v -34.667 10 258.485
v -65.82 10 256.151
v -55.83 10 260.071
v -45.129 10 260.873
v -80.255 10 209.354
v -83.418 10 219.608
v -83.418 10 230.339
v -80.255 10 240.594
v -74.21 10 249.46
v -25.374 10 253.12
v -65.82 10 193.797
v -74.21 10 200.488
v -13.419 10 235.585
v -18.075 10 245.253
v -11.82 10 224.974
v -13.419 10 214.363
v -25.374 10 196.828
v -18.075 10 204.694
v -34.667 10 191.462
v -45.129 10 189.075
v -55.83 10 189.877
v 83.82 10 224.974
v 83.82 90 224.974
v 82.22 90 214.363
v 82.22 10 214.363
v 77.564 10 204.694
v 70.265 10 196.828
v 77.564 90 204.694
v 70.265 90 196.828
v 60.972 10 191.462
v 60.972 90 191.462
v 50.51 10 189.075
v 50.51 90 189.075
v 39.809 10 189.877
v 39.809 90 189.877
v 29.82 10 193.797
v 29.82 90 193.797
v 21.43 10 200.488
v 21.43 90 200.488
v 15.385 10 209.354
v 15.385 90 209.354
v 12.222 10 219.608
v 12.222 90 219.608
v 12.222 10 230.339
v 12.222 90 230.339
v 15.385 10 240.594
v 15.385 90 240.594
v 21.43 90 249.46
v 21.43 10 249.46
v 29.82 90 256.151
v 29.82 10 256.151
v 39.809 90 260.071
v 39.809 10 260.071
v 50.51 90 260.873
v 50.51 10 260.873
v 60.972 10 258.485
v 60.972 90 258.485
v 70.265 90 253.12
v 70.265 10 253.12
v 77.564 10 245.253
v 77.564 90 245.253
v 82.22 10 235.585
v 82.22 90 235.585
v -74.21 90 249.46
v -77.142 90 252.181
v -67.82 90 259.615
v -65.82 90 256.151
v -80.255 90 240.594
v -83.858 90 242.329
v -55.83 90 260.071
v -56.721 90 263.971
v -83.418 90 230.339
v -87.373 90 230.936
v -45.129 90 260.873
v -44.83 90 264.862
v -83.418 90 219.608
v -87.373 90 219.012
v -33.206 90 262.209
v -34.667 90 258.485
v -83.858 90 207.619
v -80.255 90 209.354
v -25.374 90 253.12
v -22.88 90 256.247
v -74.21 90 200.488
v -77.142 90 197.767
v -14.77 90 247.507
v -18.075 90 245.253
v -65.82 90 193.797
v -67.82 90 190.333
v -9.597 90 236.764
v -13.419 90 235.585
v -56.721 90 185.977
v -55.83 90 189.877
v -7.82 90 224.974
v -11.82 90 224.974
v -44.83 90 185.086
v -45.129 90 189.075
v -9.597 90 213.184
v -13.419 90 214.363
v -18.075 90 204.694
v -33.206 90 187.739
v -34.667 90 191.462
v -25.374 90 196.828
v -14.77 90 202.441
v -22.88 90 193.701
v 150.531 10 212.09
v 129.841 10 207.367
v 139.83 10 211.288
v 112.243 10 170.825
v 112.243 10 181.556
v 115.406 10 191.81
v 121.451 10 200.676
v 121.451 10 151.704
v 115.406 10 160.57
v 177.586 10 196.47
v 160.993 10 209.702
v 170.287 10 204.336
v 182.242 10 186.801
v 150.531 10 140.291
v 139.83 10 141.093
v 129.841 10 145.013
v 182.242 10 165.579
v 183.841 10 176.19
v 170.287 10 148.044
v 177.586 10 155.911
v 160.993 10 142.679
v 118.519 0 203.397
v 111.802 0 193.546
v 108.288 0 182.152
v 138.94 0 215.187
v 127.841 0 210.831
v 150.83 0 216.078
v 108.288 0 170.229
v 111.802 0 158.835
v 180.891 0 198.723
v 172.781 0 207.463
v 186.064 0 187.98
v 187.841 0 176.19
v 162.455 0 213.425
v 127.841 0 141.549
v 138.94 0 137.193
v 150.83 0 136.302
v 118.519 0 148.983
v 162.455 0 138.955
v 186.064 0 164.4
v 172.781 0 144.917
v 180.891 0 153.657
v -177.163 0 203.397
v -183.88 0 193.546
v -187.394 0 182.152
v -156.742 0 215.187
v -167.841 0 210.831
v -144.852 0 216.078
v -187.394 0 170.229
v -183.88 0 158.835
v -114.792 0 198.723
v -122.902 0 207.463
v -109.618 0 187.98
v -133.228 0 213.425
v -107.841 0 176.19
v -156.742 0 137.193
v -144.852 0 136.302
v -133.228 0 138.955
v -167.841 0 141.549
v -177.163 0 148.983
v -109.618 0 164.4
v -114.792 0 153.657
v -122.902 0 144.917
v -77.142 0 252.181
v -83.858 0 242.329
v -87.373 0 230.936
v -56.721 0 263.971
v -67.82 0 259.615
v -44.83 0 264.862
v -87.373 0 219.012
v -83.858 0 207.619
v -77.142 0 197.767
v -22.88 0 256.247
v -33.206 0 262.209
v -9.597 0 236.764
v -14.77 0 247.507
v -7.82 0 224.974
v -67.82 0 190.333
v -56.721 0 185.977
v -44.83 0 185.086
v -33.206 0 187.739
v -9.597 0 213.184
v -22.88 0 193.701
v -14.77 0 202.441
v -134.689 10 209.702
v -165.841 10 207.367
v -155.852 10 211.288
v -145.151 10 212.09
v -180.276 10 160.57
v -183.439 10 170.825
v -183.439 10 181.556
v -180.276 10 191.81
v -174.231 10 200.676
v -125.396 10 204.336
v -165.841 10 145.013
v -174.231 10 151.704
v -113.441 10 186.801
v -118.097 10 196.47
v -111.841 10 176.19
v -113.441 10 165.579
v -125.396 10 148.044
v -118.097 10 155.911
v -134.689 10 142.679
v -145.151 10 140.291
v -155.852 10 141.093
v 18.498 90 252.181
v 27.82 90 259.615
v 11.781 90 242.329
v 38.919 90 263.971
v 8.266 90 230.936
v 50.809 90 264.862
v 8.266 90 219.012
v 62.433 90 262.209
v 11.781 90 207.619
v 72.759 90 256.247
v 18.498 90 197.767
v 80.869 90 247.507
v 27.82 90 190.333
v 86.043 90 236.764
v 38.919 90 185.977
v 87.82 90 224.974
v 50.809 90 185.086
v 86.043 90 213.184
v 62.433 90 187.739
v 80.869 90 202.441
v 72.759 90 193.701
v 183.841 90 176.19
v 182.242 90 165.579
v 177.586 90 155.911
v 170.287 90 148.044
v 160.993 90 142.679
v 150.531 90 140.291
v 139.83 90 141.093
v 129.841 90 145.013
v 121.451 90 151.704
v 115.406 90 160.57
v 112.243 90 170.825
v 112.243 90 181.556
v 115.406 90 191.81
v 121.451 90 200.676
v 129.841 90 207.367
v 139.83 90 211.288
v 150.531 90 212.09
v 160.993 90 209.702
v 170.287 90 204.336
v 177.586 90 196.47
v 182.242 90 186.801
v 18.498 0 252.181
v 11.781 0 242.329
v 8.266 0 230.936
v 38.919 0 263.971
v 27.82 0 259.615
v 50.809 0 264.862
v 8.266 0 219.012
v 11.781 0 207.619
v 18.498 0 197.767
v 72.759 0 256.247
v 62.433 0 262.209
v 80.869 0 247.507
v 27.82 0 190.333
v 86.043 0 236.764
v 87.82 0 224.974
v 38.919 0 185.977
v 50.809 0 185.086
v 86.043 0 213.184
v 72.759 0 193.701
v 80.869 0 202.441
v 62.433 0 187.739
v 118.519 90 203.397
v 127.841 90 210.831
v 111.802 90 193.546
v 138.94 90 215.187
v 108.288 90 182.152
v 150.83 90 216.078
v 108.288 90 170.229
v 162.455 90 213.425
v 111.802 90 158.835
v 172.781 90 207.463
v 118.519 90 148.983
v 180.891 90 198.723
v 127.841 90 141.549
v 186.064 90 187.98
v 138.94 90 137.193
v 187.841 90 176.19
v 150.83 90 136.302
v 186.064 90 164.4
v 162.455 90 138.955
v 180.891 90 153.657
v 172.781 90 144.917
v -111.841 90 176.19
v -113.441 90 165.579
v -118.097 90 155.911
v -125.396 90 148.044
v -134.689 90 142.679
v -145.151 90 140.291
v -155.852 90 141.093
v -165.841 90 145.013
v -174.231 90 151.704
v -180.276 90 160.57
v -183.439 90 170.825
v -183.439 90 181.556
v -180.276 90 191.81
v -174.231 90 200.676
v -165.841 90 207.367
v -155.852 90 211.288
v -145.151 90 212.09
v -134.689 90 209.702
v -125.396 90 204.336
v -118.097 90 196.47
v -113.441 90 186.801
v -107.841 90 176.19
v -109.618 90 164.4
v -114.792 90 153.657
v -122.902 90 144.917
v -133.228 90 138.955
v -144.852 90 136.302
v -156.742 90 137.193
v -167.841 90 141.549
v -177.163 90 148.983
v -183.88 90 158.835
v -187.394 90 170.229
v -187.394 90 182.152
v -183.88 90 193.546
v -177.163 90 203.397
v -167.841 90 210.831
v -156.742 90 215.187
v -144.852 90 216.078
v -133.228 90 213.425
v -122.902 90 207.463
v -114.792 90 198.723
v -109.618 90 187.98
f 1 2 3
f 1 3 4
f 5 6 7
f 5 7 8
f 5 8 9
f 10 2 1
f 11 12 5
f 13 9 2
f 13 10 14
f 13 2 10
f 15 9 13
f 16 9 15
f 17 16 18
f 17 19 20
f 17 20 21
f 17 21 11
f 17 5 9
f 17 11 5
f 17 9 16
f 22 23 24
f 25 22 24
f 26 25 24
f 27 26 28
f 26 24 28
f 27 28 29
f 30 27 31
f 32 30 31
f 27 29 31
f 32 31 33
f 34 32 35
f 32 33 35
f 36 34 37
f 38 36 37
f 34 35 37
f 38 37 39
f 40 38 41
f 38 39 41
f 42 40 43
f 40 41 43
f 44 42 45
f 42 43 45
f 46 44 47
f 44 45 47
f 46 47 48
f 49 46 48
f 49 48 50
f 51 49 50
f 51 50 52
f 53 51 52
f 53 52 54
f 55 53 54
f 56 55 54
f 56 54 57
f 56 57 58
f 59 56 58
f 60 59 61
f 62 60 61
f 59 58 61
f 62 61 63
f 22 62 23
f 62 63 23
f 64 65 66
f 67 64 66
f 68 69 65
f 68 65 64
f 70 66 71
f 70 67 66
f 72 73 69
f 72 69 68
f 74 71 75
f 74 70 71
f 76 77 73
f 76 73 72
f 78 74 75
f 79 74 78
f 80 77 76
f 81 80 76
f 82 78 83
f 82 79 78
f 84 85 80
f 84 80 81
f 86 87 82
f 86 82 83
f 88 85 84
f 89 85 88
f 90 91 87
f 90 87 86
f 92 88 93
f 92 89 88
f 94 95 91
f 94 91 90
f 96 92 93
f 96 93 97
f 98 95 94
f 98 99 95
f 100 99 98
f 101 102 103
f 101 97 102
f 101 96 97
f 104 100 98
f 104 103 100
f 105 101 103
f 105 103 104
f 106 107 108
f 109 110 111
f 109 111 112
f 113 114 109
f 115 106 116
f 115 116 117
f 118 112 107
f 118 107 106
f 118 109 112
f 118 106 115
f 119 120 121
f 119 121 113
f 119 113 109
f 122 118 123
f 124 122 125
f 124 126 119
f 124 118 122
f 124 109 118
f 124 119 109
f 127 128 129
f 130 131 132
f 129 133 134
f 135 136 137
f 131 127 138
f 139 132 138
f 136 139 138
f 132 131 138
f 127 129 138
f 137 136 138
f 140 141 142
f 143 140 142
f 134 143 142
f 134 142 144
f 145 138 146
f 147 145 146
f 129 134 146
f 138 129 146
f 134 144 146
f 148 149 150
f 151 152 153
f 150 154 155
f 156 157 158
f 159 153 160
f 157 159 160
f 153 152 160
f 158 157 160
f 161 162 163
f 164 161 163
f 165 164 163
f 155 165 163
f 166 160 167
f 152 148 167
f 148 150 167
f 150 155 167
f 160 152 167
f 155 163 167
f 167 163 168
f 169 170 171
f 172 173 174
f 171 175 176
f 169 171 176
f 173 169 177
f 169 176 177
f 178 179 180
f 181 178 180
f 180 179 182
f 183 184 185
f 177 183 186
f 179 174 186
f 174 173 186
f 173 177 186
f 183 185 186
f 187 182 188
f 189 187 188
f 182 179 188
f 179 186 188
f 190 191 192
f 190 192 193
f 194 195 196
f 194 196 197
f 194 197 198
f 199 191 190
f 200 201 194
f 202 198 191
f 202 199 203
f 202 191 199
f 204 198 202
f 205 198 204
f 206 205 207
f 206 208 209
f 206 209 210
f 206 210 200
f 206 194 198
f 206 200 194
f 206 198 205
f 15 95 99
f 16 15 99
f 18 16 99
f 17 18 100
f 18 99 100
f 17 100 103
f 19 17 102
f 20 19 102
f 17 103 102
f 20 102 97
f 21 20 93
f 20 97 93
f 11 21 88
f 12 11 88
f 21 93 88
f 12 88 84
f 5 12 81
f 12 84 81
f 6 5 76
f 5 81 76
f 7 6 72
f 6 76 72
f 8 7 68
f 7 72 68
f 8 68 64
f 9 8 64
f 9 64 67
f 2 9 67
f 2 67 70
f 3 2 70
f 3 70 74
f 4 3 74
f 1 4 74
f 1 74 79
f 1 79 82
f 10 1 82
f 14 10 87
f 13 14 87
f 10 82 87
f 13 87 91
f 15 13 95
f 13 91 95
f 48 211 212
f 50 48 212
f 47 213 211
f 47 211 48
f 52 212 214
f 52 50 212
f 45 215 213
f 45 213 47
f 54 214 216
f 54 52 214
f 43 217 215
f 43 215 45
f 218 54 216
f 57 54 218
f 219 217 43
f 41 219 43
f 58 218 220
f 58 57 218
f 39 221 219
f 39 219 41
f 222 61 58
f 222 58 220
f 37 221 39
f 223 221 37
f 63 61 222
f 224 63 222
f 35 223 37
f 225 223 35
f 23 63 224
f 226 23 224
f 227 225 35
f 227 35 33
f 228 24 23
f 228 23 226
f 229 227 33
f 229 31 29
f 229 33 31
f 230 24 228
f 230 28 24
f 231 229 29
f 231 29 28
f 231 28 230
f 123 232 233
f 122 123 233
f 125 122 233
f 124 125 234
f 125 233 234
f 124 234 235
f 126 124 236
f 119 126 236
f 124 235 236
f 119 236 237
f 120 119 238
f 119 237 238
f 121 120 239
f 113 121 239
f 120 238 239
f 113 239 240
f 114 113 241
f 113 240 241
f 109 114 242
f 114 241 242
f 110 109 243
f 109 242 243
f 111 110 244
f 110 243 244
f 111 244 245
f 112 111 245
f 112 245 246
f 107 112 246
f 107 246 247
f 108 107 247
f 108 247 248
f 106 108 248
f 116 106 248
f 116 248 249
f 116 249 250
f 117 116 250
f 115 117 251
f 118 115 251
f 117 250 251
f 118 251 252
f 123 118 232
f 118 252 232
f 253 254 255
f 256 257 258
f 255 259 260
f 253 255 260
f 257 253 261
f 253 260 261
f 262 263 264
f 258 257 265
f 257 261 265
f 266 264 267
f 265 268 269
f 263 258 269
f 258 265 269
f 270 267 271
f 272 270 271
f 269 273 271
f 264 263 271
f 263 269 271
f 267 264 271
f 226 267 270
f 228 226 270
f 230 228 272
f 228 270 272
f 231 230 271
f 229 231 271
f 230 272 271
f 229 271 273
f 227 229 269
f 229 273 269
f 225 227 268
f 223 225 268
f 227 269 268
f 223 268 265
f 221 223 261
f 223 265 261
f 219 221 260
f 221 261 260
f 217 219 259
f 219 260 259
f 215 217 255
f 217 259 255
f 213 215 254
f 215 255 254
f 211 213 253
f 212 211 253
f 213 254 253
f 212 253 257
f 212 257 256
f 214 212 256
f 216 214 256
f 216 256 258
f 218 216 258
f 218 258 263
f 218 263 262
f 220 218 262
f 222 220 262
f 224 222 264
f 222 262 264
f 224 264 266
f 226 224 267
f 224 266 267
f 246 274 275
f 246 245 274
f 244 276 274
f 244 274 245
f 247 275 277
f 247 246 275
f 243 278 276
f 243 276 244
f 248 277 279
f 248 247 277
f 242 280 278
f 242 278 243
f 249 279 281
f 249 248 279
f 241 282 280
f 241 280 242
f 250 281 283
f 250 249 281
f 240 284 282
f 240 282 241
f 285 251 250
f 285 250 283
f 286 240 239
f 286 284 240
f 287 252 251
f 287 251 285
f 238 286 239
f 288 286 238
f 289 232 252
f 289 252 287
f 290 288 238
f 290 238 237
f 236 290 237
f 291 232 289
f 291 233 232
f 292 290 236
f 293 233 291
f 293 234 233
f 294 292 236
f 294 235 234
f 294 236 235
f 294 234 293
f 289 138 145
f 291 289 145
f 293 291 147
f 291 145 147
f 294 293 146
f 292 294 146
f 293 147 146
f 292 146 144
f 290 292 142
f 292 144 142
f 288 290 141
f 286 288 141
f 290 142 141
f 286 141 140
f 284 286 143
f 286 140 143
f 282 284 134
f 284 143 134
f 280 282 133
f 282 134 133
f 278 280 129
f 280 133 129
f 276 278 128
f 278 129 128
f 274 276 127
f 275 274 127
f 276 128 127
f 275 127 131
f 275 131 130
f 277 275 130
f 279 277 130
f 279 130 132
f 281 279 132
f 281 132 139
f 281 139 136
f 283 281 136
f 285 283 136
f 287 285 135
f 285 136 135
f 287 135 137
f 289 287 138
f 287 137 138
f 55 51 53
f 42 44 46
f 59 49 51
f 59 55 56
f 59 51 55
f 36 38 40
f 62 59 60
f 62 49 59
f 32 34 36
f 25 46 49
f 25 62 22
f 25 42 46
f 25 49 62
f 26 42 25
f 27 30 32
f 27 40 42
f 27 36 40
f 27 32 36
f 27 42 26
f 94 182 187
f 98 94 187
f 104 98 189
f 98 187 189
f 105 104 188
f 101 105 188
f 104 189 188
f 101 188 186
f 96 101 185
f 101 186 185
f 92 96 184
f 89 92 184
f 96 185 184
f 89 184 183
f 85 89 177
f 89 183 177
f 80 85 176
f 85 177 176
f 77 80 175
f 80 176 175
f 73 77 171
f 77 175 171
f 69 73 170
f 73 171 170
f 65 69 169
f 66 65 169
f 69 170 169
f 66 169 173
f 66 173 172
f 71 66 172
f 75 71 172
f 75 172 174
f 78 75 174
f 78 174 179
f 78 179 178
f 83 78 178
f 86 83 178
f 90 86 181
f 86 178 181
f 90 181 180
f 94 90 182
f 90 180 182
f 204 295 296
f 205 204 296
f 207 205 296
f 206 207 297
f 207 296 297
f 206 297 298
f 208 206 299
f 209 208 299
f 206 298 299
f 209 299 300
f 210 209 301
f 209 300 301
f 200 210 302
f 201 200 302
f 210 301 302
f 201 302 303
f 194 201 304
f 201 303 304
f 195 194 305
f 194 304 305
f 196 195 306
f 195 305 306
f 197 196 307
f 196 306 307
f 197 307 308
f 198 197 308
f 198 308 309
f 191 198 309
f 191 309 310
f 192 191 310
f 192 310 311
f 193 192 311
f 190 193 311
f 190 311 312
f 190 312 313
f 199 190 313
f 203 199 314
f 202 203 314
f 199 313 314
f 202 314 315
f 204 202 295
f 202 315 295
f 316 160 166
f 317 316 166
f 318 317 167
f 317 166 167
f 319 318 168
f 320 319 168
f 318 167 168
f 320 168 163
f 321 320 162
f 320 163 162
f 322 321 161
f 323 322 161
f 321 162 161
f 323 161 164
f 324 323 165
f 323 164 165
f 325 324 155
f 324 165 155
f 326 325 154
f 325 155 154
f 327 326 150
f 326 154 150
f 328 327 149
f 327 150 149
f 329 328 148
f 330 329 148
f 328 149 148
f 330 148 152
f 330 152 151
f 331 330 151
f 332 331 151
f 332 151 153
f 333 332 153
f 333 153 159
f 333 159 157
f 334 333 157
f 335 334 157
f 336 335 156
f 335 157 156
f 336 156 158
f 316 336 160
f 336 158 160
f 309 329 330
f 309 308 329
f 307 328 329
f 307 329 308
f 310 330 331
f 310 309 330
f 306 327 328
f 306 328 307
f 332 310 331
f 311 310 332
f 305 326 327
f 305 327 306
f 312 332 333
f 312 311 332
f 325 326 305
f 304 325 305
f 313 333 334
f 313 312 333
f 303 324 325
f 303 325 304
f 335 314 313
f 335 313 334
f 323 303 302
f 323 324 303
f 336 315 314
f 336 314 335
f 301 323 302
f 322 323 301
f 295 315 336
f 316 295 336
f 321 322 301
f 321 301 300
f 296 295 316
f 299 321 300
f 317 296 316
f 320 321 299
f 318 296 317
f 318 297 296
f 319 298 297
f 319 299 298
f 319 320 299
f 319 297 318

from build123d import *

# Parameters (mm, degrees)
SKETCH1_R             = 40
BOSS_EXTRUDE2_DEPTH   = 90
BOSS_EXTRUDE2_2_DEPTH = 90
BOSS_EXTRUDE2_3_DEPTH = 90
BOSS_EXTRUDE2_4_DEPTH = 90
SKETCH2_R             = 36
CUT_EXTRUDE1_DEPTH    = 80


with BuildPart() as part:
    # Sketch1 → Boss-Extrude2 (new body)
    with BuildSketch(Plane(origin=(0, 0, 0), x_dir=(1, 0, 0), z_dir=(0, 1, 0))):
        with Locations((-147.841150228, -176.190221917)):
            Circle(SKETCH1_R)
    extrude(amount=BOSS_EXTRUDE2_DEPTH)


with BuildPart() as body_2:
    # Sketch1 → Boss-Extrude2 2 (new body)
    with BuildSketch(Plane(origin=(0, 0, 0), x_dir=(1, 0, 0), z_dir=(0, 1, 0))):
        with Locations((-47.819688888, -224.973948169)):
            Circle(SKETCH1_R)
    extrude(amount=BOSS_EXTRUDE2_2_DEPTH)


with BuildPart() as body_3:
    # Sketch1 → Boss-Extrude2 3 (new body)
    with BuildSketch(Plane(origin=(0, 0, 0), x_dir=(1, 0, 0), z_dir=(0, 1, 0))):
        with Locations((47.819688888, -224.973948169)):
            Circle(SKETCH1_R)
    extrude(amount=BOSS_EXTRUDE2_3_DEPTH)


with BuildPart() as body_4:
    # Sketch1 → Boss-Extrude2 4 (new body)
    with BuildSketch(Plane(origin=(0, 0, 0), x_dir=(1, 0, 0), z_dir=(0, 1, 0))):
        with Locations((147.841150228, -176.190221917)):
            Circle(SKETCH1_R)
    extrude(amount=BOSS_EXTRUDE2_4_DEPTH)


with BuildPart() as cut_extrude1_tool:
    # Sketch2 → Cut-Extrude1 (new body)
    with BuildSketch(Plane(origin=(0, 90, 0), x_dir=(1, 0, 0), z_dir=(0, 1, 0))):
        with Locations((-47.819688888, -224.973948169)):
            Circle(SKETCH2_R)
        with Locations((-147.841150228, -176.190221917)):
            Circle(SKETCH2_R)
        with Locations((47.819688888, -224.973948169)):
            Circle(SKETCH2_R)
        with Locations((147.841150228, -176.190221917)):
            Circle(SKETCH2_R)
    extrude(amount=-CUT_EXTRUDE1_DEPTH)


with BuildPart() as part_1:
    add(part.part)

    # Cut-Extrude1: cut by cut_extrude1_tool
    add(cut_extrude1_tool.part, mode=Mode.SUBTRACT)


with BuildPart() as body_2_1:
    add(body_2.part)

    # Cut-Extrude1: cut by cut_extrude1_tool
    add(cut_extrude1_tool.part, mode=Mode.SUBTRACT)


with BuildPart() as body_3_1:
    add(body_3.part)

    # Cut-Extrude1: cut by cut_extrude1_tool
    add(cut_extrude1_tool.part, mode=Mode.SUBTRACT)


with BuildPart() as body_4_1:
    add(body_4.part)

    # Cut-Extrude1: cut by cut_extrude1_tool
    add(cut_extrude1_tool.part, mode=Mode.SUBTRACT)


solid = Compound([part_1.part, body_2_1.part, body_3_1.part, body_4_1.part])
